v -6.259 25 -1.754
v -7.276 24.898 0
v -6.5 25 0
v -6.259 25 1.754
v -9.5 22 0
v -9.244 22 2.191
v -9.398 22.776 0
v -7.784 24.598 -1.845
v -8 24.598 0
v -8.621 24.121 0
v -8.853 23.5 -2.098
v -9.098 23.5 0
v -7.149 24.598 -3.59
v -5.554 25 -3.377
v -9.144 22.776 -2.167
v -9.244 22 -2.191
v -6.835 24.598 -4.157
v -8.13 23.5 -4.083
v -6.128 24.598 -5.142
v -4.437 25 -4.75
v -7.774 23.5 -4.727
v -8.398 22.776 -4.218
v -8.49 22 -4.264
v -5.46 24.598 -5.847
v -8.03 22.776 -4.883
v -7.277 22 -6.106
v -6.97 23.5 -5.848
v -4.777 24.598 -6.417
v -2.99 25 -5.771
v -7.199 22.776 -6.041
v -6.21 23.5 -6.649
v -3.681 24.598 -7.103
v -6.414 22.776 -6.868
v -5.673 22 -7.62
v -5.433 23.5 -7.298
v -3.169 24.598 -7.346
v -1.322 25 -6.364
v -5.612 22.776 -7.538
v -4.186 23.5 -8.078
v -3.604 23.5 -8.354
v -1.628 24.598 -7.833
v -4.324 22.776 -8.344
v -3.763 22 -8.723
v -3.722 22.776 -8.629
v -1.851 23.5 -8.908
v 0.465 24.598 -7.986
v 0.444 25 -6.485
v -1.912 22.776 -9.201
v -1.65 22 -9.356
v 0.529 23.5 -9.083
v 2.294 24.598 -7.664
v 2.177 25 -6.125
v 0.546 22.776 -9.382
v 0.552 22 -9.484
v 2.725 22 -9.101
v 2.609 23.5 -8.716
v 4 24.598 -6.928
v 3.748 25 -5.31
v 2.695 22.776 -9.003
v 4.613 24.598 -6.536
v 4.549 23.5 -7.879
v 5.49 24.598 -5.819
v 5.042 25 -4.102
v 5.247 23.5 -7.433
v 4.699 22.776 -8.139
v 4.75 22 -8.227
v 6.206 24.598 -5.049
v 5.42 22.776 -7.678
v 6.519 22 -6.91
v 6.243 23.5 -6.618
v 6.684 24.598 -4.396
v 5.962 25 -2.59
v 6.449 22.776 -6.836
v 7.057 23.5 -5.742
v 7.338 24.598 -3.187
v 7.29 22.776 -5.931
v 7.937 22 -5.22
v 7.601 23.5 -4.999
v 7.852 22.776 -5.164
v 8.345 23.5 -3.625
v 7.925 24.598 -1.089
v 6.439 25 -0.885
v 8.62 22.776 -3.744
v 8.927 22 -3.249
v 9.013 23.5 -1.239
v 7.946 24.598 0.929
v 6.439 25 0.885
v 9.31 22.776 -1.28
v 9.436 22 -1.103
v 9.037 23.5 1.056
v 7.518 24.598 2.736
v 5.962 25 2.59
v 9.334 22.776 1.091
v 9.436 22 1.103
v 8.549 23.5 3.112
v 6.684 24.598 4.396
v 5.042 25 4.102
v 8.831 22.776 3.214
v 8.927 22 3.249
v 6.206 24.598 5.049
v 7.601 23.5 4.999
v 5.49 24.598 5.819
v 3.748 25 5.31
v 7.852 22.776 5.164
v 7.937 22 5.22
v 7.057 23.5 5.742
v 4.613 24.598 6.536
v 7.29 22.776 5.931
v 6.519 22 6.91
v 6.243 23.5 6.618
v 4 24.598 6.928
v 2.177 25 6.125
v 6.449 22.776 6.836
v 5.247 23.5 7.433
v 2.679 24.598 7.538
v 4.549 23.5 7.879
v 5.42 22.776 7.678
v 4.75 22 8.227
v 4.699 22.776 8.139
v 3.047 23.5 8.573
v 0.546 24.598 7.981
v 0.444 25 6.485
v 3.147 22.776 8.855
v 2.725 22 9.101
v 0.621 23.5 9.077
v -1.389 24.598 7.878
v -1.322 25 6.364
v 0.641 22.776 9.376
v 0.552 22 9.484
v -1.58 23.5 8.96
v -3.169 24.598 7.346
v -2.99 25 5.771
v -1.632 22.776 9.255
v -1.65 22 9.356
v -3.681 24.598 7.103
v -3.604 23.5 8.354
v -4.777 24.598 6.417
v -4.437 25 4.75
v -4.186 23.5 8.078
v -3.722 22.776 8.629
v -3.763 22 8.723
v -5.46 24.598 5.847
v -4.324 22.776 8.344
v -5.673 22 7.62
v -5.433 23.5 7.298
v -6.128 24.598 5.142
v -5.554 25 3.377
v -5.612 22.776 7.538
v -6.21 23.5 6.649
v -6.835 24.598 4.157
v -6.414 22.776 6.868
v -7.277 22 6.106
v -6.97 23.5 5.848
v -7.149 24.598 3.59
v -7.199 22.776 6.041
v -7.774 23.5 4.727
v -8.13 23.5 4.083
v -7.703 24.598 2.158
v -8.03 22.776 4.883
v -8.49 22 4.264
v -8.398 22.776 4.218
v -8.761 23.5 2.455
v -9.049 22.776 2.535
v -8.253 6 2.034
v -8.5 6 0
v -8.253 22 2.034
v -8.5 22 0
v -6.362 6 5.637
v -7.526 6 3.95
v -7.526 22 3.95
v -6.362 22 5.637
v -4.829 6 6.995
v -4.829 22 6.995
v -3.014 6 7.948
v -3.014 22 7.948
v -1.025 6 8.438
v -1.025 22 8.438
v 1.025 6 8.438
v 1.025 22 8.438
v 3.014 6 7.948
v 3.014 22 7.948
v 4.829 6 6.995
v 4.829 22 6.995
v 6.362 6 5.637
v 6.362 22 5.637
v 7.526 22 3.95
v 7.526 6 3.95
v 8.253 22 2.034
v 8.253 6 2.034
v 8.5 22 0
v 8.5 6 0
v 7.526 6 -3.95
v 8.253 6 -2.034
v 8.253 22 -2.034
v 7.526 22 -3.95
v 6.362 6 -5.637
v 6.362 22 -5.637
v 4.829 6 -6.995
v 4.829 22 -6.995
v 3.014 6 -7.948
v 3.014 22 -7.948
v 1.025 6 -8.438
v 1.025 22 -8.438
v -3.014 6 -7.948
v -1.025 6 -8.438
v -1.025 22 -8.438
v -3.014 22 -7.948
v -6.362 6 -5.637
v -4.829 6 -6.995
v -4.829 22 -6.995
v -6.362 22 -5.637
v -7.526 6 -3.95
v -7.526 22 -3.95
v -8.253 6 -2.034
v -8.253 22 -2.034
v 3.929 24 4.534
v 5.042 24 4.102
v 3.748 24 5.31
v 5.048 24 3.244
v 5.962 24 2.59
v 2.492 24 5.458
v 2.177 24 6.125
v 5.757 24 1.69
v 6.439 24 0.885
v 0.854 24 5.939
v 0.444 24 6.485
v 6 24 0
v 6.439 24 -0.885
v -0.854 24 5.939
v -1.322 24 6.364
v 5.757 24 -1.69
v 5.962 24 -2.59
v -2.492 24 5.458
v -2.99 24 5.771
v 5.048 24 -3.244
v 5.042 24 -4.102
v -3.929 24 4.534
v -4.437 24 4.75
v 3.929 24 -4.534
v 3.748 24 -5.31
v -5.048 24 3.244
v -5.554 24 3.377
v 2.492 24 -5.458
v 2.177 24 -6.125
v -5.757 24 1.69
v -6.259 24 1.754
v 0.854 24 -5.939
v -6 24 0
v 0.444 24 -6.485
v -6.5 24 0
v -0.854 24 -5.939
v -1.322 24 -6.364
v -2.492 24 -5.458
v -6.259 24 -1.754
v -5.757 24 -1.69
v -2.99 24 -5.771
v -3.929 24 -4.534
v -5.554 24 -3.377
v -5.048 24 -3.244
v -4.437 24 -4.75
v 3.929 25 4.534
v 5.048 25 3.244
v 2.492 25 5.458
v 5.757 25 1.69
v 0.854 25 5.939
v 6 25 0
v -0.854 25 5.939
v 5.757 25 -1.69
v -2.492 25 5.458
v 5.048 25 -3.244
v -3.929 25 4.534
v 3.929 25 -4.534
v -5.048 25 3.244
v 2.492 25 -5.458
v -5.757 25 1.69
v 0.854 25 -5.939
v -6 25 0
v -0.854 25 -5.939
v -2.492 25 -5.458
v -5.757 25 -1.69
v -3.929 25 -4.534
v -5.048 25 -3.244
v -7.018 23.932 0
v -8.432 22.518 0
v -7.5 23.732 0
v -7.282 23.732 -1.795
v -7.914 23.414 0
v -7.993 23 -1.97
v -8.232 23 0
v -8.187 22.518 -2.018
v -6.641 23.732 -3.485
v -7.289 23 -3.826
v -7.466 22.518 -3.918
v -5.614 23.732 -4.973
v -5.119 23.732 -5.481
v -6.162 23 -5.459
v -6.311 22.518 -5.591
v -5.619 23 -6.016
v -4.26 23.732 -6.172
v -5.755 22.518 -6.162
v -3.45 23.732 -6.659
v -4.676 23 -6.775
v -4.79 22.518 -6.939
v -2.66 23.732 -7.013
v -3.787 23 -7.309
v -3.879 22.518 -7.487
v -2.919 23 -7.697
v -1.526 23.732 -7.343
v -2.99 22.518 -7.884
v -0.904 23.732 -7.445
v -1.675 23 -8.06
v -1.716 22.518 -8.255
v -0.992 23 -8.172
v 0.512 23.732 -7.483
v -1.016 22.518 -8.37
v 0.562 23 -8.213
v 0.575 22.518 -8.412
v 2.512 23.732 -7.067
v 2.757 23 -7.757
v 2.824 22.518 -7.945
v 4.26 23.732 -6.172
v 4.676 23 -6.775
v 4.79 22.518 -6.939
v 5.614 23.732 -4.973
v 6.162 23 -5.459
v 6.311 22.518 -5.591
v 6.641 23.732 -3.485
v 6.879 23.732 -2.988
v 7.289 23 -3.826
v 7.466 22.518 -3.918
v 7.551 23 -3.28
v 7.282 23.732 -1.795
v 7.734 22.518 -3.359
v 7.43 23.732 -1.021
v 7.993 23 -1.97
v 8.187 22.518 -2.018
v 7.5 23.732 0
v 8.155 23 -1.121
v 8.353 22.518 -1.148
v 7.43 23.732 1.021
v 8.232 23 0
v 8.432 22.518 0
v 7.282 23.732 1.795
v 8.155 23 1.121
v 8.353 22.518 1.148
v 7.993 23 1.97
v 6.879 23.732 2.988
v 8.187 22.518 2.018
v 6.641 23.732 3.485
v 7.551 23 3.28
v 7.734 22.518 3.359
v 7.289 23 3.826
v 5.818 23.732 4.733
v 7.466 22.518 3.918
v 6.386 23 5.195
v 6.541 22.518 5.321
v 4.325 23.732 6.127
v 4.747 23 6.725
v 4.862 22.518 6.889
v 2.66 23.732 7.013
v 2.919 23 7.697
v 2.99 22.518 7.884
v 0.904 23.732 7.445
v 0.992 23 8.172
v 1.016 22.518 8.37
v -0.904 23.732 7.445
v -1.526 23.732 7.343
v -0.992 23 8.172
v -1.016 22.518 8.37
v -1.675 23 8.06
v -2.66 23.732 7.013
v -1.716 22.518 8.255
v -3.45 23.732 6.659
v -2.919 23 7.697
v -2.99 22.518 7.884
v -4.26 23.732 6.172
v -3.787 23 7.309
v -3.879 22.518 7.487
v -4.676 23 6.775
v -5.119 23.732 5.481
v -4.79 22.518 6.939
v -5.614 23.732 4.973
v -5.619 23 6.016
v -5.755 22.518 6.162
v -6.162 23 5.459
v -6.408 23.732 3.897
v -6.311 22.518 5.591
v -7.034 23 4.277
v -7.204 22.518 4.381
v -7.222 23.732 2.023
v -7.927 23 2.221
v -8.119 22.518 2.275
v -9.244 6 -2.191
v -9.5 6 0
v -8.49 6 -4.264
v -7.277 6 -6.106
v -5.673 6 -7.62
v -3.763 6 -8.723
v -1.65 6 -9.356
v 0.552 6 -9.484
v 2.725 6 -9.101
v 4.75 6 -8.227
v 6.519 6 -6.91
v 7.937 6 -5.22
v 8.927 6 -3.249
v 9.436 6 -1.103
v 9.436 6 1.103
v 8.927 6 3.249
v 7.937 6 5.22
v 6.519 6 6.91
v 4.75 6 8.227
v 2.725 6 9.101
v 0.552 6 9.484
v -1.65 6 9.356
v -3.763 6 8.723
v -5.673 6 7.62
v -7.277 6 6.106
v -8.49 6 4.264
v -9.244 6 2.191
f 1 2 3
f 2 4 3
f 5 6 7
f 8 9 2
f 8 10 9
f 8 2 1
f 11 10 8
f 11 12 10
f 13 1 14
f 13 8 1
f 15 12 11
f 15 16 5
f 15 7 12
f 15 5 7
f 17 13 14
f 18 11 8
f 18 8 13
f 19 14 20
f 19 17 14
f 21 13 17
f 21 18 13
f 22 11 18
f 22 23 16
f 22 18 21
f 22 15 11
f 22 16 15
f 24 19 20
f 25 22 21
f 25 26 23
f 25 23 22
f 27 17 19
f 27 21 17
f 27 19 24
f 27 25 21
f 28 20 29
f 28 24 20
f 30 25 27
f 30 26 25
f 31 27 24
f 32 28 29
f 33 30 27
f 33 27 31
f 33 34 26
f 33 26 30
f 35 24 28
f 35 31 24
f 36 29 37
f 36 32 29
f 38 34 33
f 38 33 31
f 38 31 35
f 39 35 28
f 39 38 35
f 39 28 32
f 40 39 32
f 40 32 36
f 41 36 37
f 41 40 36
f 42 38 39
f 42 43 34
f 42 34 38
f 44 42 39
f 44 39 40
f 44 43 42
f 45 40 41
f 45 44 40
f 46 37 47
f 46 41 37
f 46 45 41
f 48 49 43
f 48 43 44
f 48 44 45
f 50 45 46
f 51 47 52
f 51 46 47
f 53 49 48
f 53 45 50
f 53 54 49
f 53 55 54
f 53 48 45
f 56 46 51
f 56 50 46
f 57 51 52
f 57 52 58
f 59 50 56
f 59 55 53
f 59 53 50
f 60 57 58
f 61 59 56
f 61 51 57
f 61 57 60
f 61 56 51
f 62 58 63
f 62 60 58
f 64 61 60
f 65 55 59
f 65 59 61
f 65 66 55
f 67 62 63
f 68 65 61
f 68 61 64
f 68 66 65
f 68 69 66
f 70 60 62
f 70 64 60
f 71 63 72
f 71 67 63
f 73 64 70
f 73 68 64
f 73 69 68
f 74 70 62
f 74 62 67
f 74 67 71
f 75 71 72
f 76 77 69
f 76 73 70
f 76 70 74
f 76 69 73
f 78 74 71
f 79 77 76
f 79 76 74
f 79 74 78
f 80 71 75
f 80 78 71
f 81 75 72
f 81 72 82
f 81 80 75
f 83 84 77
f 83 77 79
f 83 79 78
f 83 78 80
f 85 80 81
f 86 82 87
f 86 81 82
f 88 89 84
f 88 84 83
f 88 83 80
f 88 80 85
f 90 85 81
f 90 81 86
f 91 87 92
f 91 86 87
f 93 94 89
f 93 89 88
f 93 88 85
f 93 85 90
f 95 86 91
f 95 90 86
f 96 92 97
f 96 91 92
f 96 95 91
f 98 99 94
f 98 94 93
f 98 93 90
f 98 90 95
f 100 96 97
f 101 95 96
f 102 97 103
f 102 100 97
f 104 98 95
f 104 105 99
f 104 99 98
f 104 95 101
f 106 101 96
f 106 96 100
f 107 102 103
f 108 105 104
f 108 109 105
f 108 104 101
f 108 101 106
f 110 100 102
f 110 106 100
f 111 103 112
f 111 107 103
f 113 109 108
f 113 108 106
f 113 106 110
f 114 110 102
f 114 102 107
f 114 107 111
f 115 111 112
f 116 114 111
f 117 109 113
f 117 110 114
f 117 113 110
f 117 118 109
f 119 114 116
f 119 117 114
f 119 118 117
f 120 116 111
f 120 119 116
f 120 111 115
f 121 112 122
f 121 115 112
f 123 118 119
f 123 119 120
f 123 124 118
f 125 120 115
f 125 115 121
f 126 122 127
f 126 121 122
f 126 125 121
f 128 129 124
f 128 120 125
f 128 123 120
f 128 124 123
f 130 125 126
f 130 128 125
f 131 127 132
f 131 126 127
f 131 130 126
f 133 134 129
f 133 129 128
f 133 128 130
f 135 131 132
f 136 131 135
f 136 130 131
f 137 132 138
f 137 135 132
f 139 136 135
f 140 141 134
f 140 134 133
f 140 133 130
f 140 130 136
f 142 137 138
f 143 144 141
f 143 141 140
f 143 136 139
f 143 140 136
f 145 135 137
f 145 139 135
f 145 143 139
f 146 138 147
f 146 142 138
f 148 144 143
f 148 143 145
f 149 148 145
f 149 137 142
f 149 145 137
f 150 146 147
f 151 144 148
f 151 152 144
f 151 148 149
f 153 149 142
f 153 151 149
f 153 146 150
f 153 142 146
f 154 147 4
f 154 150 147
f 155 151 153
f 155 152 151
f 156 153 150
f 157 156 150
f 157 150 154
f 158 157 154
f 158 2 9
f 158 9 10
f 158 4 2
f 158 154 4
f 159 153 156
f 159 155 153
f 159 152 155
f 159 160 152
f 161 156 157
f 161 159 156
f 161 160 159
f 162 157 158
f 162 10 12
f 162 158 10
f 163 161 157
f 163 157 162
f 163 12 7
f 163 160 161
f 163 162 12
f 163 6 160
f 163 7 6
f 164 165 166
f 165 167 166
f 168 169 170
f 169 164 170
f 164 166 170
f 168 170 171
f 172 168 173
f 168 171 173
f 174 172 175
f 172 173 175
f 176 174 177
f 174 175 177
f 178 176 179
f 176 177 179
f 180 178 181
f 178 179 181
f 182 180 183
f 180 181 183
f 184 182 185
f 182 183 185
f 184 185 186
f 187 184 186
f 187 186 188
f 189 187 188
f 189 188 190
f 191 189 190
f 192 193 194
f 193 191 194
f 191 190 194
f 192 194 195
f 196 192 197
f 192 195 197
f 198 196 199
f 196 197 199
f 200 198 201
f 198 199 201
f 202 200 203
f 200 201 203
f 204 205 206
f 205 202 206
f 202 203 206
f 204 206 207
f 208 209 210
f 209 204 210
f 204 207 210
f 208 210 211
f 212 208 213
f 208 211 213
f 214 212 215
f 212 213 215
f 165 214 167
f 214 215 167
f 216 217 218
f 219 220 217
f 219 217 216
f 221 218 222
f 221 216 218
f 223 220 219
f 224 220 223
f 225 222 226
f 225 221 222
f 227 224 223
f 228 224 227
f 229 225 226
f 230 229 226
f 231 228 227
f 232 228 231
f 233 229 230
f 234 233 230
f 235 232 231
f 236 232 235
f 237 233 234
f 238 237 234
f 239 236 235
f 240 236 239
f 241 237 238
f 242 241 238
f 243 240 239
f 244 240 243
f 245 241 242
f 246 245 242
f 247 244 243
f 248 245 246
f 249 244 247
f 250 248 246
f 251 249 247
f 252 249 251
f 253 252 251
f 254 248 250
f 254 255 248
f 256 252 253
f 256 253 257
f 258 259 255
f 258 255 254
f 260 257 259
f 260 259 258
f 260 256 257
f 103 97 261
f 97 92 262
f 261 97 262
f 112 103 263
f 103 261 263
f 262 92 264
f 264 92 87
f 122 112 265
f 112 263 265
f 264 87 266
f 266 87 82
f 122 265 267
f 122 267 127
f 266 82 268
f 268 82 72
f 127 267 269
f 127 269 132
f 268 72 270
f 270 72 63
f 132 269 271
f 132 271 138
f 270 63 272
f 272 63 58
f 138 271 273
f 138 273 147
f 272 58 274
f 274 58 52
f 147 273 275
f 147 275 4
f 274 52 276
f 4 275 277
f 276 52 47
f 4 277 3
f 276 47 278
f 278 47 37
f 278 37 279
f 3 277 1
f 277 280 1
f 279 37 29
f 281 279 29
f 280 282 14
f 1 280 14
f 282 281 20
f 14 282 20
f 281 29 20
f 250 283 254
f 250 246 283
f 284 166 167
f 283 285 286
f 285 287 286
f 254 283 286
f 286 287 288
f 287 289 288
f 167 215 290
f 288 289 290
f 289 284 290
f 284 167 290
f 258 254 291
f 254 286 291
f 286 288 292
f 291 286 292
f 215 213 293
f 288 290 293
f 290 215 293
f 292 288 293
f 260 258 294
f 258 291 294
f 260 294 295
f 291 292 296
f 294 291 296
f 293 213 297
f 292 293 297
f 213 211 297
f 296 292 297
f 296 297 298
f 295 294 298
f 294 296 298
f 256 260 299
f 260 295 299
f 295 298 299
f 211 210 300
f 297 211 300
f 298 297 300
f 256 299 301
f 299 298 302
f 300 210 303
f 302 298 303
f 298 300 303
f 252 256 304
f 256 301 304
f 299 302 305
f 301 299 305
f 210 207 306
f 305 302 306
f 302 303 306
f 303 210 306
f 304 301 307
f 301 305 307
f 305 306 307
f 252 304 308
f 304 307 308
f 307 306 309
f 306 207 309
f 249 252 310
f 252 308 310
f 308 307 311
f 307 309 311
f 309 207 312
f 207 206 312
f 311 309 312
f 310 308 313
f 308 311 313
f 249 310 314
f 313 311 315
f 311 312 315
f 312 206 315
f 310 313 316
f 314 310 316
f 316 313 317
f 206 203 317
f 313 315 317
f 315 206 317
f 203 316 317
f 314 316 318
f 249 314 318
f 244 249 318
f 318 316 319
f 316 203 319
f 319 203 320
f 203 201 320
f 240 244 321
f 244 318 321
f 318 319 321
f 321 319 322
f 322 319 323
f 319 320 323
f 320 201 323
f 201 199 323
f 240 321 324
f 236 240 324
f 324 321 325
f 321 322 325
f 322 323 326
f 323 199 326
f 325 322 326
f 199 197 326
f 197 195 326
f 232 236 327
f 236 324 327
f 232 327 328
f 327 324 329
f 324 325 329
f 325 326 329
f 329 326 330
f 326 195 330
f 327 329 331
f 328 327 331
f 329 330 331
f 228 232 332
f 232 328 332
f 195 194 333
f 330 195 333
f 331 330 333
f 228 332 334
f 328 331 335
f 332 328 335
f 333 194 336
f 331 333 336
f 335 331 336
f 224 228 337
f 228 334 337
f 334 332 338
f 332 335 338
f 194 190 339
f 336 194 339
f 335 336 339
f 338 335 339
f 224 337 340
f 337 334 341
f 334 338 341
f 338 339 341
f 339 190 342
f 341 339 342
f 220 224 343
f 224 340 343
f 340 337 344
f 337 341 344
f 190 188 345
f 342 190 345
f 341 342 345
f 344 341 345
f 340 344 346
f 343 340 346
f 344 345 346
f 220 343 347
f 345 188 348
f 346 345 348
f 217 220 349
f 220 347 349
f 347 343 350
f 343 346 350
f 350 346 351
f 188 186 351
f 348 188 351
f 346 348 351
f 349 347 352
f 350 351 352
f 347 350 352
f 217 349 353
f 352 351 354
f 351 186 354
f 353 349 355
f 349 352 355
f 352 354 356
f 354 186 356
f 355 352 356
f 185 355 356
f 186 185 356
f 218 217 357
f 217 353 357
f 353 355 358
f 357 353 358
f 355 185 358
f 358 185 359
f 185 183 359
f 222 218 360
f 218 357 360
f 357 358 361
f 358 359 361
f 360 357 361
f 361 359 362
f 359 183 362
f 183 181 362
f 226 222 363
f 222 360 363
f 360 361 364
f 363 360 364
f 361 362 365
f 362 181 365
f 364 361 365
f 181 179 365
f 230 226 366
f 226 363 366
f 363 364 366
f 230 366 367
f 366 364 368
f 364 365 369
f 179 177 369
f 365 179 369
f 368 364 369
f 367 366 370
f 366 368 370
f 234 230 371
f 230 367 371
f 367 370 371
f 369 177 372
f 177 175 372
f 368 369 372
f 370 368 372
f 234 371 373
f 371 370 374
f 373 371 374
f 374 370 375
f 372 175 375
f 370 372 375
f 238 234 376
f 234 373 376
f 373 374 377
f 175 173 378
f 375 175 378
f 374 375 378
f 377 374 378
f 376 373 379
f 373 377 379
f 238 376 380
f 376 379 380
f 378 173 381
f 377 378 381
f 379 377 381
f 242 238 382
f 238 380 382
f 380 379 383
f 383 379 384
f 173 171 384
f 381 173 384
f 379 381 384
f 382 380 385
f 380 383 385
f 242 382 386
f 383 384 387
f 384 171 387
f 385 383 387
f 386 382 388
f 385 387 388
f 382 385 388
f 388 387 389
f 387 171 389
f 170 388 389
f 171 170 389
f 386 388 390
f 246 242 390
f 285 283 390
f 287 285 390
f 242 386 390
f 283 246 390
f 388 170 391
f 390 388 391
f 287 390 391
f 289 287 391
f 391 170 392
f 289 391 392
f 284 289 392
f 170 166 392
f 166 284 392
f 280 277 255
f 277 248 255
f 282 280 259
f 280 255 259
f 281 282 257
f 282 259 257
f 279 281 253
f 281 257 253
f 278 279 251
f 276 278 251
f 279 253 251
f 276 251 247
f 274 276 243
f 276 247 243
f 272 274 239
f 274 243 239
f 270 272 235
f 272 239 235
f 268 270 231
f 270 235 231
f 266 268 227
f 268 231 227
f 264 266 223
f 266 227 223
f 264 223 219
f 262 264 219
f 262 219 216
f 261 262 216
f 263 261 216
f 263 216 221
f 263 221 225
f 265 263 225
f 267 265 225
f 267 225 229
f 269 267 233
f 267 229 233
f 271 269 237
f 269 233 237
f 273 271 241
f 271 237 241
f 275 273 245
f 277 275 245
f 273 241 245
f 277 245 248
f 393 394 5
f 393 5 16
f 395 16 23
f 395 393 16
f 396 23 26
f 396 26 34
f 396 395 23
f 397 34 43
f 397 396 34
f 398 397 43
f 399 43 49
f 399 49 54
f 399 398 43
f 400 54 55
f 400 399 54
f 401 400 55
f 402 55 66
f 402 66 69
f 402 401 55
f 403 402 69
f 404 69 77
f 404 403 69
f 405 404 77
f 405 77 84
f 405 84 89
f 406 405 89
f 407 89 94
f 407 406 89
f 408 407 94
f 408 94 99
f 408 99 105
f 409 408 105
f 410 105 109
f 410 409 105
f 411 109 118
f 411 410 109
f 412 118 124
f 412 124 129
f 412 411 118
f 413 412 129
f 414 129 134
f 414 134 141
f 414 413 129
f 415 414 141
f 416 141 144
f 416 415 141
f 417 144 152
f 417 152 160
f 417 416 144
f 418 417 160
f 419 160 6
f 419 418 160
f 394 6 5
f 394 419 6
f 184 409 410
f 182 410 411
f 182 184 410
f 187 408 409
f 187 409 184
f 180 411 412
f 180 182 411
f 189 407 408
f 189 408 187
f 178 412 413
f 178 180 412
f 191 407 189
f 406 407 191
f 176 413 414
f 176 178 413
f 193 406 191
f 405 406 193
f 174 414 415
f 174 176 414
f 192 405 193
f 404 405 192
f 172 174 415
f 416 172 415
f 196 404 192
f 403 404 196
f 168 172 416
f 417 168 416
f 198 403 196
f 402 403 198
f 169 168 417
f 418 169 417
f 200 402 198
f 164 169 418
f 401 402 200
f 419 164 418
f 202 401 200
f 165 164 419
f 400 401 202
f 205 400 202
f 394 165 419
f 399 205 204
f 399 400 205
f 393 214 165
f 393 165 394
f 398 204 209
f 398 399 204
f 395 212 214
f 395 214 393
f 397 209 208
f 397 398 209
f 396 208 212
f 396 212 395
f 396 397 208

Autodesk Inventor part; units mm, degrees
ref_plane "YZ Plane" through (0, 0, 0) normal (1, 0, 0) x (0, 1, 0)
ref_plane "XZ Plane" through (0, 0, 0) normal (0, 1, 0) x (-1, 0, 0)
ref_plane "XY Plane" through (0, 0, 0) normal (0, 0, 1) x (1, 0, 0)
sketch "Sketch1" plane through (0, 0, 0) normal (0, 0, 1) x (1, 0, 0)
  line L0 (11.5, 9) -> (11.5, 6) construction
  arc A0 (11.5, 6) -> (13.5, 6) centre (12.5, 6) ccw construction
  line L1 (13.5, 6) -> (13.5, 19.8063) construction
  arc A1 (13.5, 19.8063) -> (12, 21.3063) centre (12, 19.8063) ccw construction
  arc A2 (12, 24.3063) -> (12, 21.3063) centre (12, 22.8063) ccw construction
  arc A3 (12, 24.3063) -> (13.5, 25.8063) centre (12, 25.8063) ccw construction
  line L2 (13.5, 25.8063) -> (13.5, 71) construction
  arc A4 (13.5, 71) -> (11.5, 73) centre (11.5, 71) ccw construction
  line L3 (11.5, 73) -> (2, 73) construction
  line L4 (2, 73) -> (2, 80) construction
  arc A5 (2, 80) -> (1.2, 81.6) centre (0, 80) ccw construction
  arc A6 (0, 84) -> (1.2, 81.6) centre (3, 84) ccw construction
  arc A7 (-1.2, 81.6) -> (0, 84) centre (-3, 84) ccw construction
  arc A8 (-1.2, 81.6) -> (-2, 80) centre (0, 80) ccw construction
  line L5 (-2, 80) -> (-2, 73) construction
  line L6 (-2, 73) -> (-11.5, 73) construction
  arc A9 (-11.5, 73) -> (-13.5, 71) centre (-11.5, 71) ccw construction
  line L7 (-13.5, 71) -> (-13.5, 25.8063) construction
  arc A10 (-13.5, 25.8063) -> (-12, 24.3063) centre (-12, 25.8063) ccw construction
  arc A11 (-12, 21.3063) -> (-12, 24.3063) centre (-12, 22.8063) ccw construction
  arc A12 (-12, 21.3063) -> (-13.5, 19.8063) centre (-12, 19.8063) ccw construction
  line L8 (-13.5, 19.8063) -> (-13.5, 6) construction
  arc A13 (-13.5, 6) -> (-11.5, 6) centre (-12.5, 6) ccw construction
  line L9 (-11.5, 6) -> (-11.5, 9) construction
  arc A14 (-9.5, 11) -> (-11.5, 9) centre (-9.5, 9) ccw construction
  line L10 (-9.5, 11) -> (-9.5, 6) construction
  arc A15 (-15.5, 6) -> (-9.5, 6) centre (-12.5, 6) ccw construction
  line L11 (-15.5, 6) -> (-15.5, 19.8063) construction
  arc A16 (-13.8028, 22.8063) -> (-15.5, 19.8063) centre (-12, 19.8063) ccw construction
  arc A17 (-15.5, 25.8063) -> (-13.8028, 22.8063) centre (-12, 25.8063) ccw construction
  line L12 (-15.5, 25.8063) -> (-15.5, 71) construction
  arc A18 (-11.5, 75) -> (-15.5, 71) centre (-11.5, 71) ccw construction
  line L13 (-11.5, 75) -> (-3, 75) construction
  line L14 (-3, 75) -> (-3, 80) construction
  arc A19 (-1.8, 82.4) -> (-3, 80) centre (0, 80) ccw construction
  arc A20 (-1.8, 82.4) -> (-1, 84) centre (-3, 84) ccw construction
  arc A21 (0, 85) -> (-1, 84) centre (0, 84) ccw construction
  arc A22 (1, 84) -> (0, 85) centre (0, 84) ccw construction
  arc A23 (1, 84) -> (1.8, 82.4) centre (3, 84) ccw construction
  arc A24 (3, 80) -> (1.8, 82.4) centre (0, 80) ccw construction
  line L15 (3, 80) -> (3, 75) construction
  line L16 (3, 75) -> (11.5, 75) construction
  arc A25 (15.5, 71) -> (11.5, 75) centre (11.5, 71) ccw construction
  line L17 (15.5, 71) -> (15.5, 25.8063) construction
  arc A26 (13.8028, 22.8063) -> (15.5, 25.8063) centre (12, 25.8063) ccw construction
  arc A27 (15.5, 19.8063) -> (13.8028, 22.8063) centre (12, 19.8063) ccw construction
  line L18 (15.5, 19.8063) -> (15.5, 6) construction
  arc A28 (9.5, 6) -> (15.5, 6) centre (12.5, 6) ccw construction
  line L19 (9.5, 6) -> (9.5, 11) construction
  arc A29 (11.5, 9) -> (9.5, 11) centre (9.5, 9) ccw construction
  line L20 (-9.5, 6) -> (-8.5, 6)
  line L21 (-8.5, 6) -> (-8.5, 22)
  line L22 (-9.5, 22) -> (-9.5, 6)
  arc A30 (-6.5, 25) -> (-9.5, 22) centre (-6.5, 22) ccw
  arc A31 (-6.5, 24) -> (-8.5, 22) centre (-6.5, 22) ccw
  line L23 (-6, 25) -> (-6.5, 25)
  line L24 (-6, 24) -> (-6.5, 24)
  line L25 (5.1354, 22) -> (-7.1821, 22) construction
  line L26 (0, 22) -> (0, 0) construction
  line L27 (-6, 25) -> (-6, 24)
  dimension "d0" = 1
  dimension "d2" = 18
  dimension "d3" = 6
  dimension "d4" = 2
  dimension "d5" = 6
revolve "Revolution1" add sketch "Sketch1" angle 360 about axis through (0, 22, 0) along (0, -1, 0)
equation "\"d0\" = d1"
equation "\"d1\" = 1"
properties part number "anode-bell" material "Stainless Steel"
